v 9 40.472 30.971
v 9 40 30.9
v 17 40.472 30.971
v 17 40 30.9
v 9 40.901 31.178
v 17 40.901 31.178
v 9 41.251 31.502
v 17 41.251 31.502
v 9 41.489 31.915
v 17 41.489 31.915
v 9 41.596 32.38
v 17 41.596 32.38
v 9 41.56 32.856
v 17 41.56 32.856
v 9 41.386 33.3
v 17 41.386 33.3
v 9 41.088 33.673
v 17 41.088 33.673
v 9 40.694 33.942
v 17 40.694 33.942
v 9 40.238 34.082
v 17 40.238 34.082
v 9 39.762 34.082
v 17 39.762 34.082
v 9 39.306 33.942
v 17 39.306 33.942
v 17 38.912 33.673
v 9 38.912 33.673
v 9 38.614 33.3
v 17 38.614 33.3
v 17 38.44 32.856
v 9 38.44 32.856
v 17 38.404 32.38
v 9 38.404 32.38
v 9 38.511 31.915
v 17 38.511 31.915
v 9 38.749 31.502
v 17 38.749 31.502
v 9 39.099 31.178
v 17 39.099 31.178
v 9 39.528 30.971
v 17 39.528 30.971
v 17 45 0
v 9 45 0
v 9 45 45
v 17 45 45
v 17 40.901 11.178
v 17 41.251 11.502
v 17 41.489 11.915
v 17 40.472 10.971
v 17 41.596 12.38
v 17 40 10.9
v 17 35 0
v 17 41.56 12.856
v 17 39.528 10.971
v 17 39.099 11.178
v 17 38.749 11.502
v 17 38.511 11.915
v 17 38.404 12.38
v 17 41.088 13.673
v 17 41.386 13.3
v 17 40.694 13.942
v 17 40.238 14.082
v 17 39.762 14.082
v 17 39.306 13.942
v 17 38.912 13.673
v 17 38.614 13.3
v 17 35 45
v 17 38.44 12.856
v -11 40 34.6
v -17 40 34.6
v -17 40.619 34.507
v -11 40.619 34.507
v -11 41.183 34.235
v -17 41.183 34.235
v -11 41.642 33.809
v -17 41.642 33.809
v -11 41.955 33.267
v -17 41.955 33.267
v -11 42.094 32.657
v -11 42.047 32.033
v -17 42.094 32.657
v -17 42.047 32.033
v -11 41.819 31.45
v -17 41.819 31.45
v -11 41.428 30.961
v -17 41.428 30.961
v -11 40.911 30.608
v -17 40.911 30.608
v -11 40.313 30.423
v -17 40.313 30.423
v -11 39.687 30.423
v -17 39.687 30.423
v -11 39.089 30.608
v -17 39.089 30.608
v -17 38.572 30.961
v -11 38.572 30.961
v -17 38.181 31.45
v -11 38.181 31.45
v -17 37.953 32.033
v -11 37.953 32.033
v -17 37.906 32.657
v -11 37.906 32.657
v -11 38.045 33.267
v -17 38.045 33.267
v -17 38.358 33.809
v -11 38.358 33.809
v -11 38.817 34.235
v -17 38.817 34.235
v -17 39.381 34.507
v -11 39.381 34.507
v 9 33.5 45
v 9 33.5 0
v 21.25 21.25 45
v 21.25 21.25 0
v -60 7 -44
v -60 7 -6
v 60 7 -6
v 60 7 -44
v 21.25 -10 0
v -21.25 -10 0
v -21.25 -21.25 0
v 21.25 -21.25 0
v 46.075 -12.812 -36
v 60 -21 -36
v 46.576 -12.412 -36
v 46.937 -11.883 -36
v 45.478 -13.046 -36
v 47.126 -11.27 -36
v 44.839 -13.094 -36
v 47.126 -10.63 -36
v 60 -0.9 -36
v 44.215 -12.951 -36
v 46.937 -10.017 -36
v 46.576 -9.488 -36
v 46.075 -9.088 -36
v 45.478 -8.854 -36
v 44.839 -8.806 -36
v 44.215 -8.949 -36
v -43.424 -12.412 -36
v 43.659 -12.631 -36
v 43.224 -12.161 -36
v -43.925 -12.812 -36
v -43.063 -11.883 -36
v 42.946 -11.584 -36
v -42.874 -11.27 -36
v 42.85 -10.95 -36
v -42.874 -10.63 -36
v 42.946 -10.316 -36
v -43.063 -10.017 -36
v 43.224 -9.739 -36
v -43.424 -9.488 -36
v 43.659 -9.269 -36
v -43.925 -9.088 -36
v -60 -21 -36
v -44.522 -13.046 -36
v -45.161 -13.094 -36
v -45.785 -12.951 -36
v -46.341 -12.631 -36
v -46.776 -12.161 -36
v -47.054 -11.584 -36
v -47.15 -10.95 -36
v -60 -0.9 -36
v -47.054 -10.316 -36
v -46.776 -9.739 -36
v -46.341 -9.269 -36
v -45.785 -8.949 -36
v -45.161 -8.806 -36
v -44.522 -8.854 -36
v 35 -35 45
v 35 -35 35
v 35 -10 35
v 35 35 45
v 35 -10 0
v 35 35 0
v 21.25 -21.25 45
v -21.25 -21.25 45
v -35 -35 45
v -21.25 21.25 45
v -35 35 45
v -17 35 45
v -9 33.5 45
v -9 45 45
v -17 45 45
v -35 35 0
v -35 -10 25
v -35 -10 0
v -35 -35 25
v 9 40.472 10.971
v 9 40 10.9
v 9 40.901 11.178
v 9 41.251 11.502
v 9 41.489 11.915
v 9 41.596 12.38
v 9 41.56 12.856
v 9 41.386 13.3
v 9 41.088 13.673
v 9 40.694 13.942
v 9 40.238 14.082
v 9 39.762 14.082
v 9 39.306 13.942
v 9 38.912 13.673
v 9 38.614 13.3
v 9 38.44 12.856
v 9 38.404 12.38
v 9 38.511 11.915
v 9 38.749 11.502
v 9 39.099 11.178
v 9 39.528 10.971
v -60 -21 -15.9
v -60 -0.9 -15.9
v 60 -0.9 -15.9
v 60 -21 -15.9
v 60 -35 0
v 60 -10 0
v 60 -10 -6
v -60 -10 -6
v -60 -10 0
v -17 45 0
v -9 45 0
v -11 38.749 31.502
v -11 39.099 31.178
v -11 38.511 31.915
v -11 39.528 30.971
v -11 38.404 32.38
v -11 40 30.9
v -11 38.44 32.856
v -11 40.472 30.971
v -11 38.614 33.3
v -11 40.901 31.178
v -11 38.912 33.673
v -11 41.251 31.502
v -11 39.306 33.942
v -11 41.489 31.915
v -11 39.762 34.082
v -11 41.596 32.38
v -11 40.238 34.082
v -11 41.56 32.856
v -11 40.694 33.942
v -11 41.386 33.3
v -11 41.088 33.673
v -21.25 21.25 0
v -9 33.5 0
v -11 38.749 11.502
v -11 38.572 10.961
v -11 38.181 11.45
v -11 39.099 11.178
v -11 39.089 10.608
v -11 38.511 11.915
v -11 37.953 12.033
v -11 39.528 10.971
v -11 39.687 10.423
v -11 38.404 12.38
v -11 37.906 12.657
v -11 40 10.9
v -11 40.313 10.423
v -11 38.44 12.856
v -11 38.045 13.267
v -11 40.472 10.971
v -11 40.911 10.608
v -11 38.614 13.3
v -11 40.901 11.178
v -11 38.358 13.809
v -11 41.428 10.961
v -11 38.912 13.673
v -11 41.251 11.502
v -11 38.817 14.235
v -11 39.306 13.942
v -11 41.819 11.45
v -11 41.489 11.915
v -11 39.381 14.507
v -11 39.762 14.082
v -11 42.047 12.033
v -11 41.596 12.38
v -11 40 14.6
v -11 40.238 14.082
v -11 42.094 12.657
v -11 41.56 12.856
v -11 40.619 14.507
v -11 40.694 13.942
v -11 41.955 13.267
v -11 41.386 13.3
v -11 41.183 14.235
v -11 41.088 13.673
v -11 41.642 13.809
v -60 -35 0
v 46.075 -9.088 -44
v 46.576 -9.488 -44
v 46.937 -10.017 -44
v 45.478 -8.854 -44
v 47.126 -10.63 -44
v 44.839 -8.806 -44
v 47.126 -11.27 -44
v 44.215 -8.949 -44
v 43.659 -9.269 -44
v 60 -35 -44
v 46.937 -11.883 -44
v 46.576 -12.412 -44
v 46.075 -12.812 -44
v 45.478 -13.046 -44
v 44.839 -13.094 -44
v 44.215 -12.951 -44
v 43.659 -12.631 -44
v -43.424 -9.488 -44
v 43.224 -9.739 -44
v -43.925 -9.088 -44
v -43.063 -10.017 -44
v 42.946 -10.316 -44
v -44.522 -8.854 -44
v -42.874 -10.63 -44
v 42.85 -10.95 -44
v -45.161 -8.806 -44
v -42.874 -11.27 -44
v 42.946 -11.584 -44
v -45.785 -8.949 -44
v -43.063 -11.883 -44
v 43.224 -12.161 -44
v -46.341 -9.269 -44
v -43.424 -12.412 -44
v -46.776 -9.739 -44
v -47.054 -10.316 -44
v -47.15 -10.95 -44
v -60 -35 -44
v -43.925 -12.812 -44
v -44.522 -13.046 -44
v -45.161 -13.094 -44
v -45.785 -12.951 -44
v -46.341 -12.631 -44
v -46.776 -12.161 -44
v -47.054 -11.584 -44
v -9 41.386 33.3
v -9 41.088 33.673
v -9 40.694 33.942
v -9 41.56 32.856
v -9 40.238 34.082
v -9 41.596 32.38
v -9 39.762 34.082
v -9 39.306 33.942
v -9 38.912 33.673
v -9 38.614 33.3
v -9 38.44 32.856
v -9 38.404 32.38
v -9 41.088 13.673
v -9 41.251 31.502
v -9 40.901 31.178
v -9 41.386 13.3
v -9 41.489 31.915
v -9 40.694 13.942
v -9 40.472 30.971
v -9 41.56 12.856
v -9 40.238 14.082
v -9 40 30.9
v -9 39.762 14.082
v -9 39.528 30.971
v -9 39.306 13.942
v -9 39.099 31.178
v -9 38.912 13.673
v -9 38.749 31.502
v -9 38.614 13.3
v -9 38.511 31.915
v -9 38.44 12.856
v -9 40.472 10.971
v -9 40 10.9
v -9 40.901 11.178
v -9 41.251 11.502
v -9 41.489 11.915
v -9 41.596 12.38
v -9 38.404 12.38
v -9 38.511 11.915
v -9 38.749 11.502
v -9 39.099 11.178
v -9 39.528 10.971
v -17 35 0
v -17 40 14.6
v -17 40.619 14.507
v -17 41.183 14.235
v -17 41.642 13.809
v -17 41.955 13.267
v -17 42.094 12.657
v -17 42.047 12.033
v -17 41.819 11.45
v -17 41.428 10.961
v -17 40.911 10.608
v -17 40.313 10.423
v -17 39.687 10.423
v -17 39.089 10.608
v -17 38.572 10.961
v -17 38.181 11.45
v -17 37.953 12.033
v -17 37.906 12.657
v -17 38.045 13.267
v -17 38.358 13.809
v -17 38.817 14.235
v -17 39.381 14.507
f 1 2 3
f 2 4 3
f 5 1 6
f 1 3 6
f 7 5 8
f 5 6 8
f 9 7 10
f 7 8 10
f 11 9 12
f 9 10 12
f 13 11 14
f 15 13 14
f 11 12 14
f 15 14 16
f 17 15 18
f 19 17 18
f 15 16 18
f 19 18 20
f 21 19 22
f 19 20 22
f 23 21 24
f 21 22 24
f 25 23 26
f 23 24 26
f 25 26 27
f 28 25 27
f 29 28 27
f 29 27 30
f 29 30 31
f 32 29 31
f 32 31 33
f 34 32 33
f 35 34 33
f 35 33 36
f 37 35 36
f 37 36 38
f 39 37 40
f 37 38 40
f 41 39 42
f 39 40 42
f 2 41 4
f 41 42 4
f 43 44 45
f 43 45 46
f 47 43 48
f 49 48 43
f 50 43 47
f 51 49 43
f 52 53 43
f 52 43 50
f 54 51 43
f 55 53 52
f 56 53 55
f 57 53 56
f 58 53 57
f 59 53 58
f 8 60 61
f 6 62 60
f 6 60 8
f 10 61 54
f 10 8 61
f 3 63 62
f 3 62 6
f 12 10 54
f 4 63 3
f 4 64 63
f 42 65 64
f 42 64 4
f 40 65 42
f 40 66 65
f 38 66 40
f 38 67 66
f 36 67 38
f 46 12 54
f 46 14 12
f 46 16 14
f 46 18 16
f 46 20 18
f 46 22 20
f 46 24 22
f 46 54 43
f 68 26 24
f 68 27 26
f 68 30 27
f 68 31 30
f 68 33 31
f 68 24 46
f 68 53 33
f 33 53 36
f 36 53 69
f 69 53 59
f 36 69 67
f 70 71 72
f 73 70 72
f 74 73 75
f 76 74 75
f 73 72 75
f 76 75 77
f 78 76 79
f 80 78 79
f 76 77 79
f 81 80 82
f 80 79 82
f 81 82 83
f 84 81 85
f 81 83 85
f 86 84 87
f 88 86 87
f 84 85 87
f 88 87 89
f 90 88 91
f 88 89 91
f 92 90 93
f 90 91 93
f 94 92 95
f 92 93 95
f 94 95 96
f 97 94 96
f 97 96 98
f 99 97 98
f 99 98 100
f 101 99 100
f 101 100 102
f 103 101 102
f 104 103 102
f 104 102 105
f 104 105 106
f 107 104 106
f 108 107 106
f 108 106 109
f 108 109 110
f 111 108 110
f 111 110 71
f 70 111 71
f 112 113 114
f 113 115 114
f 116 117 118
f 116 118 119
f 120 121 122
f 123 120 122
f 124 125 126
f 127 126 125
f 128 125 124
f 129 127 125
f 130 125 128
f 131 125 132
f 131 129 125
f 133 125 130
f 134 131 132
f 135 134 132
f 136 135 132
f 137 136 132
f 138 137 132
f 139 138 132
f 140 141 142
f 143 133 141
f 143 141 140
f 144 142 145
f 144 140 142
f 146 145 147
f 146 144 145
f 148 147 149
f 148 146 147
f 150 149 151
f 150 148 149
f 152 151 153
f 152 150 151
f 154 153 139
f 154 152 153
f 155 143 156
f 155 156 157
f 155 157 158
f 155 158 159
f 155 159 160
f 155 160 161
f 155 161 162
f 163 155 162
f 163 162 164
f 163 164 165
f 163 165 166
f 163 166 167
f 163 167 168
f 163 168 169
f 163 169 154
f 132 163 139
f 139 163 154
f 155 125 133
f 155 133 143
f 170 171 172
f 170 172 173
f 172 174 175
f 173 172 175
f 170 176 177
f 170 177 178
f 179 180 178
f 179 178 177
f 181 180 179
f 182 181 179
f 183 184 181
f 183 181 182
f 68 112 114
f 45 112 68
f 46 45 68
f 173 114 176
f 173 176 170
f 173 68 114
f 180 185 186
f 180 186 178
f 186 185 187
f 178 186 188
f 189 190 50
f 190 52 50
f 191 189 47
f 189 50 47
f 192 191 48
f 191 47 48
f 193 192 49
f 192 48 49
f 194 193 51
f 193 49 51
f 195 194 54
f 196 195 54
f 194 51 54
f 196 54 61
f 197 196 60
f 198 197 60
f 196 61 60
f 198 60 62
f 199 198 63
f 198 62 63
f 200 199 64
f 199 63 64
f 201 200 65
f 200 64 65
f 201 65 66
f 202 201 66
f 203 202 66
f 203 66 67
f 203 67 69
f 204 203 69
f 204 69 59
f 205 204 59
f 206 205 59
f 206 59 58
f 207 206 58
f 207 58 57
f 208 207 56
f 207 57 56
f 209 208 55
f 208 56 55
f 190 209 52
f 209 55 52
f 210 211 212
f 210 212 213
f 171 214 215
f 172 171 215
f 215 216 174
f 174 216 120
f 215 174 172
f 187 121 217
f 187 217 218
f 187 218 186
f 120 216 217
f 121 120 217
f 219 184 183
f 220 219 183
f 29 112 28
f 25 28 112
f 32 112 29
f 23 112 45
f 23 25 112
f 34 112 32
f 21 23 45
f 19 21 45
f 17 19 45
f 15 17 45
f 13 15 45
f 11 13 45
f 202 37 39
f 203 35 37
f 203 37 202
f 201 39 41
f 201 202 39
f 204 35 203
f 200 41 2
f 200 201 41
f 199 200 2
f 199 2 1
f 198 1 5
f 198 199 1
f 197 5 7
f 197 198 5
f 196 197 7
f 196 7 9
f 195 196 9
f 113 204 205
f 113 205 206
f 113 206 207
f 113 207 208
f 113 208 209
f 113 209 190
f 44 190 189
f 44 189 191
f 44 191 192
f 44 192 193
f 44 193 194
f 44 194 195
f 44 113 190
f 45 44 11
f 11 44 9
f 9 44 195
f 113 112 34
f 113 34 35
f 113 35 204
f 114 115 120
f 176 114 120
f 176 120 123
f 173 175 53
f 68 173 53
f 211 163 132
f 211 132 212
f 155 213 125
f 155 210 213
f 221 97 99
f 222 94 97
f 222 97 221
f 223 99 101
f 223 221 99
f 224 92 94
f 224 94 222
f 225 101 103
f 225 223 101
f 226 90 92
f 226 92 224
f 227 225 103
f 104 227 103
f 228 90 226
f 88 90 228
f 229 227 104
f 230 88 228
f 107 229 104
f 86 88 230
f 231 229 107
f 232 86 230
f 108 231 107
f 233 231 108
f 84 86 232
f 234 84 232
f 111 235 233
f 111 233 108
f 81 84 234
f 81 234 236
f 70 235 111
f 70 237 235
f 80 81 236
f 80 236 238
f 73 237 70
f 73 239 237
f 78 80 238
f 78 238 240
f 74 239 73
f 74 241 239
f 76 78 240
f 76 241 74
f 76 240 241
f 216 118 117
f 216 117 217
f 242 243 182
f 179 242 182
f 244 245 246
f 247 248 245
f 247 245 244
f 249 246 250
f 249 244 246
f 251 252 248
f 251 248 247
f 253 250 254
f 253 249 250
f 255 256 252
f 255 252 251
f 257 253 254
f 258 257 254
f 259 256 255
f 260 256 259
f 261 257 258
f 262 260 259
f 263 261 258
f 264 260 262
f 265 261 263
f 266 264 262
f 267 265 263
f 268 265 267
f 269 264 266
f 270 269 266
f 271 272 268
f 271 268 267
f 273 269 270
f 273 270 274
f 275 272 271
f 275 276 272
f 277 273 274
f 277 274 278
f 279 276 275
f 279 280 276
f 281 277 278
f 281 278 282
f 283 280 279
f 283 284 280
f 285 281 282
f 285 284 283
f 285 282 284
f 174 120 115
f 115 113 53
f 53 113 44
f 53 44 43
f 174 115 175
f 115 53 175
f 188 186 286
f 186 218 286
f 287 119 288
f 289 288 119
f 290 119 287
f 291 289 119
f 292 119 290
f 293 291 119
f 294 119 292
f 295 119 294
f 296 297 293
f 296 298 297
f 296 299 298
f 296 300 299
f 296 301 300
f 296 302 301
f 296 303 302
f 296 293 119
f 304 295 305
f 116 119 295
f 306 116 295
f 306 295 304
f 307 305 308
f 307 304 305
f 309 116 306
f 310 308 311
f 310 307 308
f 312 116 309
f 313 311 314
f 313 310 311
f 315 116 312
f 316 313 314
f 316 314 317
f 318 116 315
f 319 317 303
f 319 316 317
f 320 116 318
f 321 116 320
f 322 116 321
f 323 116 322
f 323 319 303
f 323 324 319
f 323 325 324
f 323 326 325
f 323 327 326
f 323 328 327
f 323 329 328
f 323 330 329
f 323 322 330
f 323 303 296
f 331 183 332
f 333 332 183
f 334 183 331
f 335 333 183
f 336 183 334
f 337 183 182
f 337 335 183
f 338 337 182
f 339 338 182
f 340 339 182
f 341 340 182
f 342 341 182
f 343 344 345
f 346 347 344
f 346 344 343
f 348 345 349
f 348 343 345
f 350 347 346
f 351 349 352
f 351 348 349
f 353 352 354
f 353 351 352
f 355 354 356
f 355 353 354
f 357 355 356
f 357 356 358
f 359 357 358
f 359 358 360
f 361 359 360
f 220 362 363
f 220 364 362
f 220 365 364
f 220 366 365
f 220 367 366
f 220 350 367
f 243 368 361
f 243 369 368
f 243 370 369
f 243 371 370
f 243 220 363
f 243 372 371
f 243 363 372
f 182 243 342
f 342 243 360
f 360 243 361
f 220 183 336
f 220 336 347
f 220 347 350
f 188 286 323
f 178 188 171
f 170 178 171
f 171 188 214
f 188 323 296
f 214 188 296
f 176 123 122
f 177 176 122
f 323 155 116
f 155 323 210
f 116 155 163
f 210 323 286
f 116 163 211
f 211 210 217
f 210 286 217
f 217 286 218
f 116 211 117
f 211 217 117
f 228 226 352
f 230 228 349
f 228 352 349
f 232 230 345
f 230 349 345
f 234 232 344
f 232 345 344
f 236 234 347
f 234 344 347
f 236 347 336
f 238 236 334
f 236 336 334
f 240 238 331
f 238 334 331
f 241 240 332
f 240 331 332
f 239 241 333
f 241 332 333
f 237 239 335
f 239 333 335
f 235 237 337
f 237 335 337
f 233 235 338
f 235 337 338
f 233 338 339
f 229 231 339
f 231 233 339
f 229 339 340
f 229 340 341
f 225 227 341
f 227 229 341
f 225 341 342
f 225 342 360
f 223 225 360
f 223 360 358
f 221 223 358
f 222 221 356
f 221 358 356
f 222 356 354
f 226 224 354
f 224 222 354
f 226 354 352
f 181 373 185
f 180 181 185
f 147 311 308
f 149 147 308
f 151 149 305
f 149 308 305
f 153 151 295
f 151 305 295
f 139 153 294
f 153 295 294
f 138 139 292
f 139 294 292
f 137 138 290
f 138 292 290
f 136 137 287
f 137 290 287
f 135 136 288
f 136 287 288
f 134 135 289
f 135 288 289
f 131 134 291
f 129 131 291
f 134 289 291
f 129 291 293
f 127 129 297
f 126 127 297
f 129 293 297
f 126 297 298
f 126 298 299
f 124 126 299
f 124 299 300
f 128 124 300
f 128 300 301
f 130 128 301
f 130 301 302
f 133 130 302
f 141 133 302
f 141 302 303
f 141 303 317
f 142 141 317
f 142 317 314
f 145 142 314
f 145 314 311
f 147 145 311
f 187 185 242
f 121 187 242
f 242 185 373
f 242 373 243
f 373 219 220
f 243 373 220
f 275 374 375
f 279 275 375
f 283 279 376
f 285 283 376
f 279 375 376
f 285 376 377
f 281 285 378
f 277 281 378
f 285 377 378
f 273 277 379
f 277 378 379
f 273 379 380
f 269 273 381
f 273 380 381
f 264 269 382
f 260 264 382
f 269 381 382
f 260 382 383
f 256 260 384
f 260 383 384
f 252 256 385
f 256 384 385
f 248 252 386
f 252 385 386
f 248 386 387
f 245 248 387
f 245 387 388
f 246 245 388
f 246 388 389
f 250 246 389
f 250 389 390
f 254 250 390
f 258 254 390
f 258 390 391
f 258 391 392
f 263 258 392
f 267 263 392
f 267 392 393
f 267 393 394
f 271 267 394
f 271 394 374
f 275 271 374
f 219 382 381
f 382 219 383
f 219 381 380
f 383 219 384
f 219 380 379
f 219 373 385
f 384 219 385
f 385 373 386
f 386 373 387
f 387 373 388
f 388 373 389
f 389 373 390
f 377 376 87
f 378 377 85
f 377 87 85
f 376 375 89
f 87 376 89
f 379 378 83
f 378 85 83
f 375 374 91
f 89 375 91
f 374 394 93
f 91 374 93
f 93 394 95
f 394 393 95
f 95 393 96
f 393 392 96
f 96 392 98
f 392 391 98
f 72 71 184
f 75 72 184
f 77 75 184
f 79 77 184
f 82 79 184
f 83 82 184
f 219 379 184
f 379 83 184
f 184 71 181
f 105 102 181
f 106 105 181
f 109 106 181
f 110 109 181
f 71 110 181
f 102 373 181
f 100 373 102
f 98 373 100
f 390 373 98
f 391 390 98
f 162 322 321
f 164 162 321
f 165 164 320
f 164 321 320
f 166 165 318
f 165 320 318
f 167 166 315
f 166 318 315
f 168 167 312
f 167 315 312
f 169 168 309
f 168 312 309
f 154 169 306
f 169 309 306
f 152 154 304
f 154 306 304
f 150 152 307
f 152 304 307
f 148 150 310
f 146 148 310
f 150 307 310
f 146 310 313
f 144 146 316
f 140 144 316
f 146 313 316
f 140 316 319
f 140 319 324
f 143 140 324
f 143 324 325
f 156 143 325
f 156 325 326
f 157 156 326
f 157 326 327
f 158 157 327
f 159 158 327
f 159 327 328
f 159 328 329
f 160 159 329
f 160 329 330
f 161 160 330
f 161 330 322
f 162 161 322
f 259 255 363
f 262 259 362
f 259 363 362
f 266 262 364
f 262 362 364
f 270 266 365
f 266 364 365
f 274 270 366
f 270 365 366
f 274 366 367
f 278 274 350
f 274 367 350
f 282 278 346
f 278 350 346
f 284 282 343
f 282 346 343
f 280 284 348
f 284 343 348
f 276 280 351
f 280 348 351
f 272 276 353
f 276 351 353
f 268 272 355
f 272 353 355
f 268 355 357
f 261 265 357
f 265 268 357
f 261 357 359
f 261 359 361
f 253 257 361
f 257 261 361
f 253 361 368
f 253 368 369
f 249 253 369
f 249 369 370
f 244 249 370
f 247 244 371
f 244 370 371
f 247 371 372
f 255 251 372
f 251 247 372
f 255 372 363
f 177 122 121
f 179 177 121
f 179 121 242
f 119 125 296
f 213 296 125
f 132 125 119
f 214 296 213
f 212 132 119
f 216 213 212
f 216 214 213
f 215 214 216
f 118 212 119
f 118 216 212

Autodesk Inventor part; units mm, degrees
ref_plane "YZ Plane" through (0, 0, 0) normal (1, 0, 0) x (0, 1, 0)
ref_plane "XZ Plane" through (0, 0, 0) normal (0, 1, 0) x (-1, 0, 0)
ref_plane "XY Plane" through (0, 0, 0) normal (0, 0, 1) x (1, 0, 0)
sketch "Sketch1" plane through (0, 0, 0) normal (0, 0, 1) x (1, 0, 0)
  line L0 (-21.25, 21.25) -> (21.25, 21.25)
  line L1 (21.25, 21.25) -> (21.25, -21.25)
  line L2 (21.25, -21.25) -> (-21.25, -21.25)
  line L3 (-21.25, -21.25) -> (-21.25, 21.25)
  line L4 (-35, -35) -> (35, -35)
  line L5 (35, -35) -> (35, 35)
  line L6 (35, 35) -> (-35, 35)
  line L7 (-35, 35) -> (-35, -35)
  line L8 (-9, 35) -> (-9, 21.25)
  line L9 (9, 21.25) -> (9, 35)
  point P0 (0, 0)
  point P1 (-21.25, 0)
  point P2 (0, 21.25)
  point P3 (-35, 0)
  point P4 (0, 35)
  dimension "d0" = 42.5
  dimension "d1" = 9
  dimension "d3" = 70
  dimension "d17" = 18
extrude "Extrusion1" add sketch "Sketch1" along normal blind 45 contours L3 L2 L1 L0 L9 L6 L5 L4 L7 L8
sketch "Sketch4" plane through (0, 0, 0) normal (1, 0, 0) x (0, 1, 0)
  line L0 (-0.9, -15.9) -> (-21, -15.9)
  line L1 (-21, -15.9) -> (-21, -36)
  line L2 (-21, -36) -> (-0.9, -36)
  line L3 (-0.9, -36) -> (-0.9, -15.9)
  line L4 (-35, 0) -> (-35, 45) projected
  line L5 (7, -6) -> (7, -44)
  line L6 (7, -44) -> (-35, -44)
  line L7 (-35, -44) -> (-35, 0)
  line L8 (7, -6) -> (-10, -6)
  line L9 (-10, -6) -> (-10, 0)
  line L10 (-10, 0) -> (-35, 0)
  point P0 (0, 0)
  dimension "d18" = 20.1
  dimension "d20" = 14
  dimension "d21" = 42
  dimension "d22" = 38
  dimension "d30" = 8
  dimension "d31" = 6
  dimension "d32" = 25
extrude "Extrusion5" add sketch "Sketch4" along normal mid plane 120
sketch "Sketch5" plane through (60, 7, -44) normal (0, 0, -1) x (-1, 0, 0)
  circle A0 centre (15, -17.95) radius 2.15
  circle A1 centre (105, -17.95) radius 2.15
  line L0 (120, -7.9) -> (120, -7.9) projected
  line L1 (120, 0) -> (120, -42) projected
  line L2 (0, -42) -> (0, 0) projected
  line L3 (120, -28) -> (120, -7.9) projected
  point P0 (60, -7)
  point P1 (120, -21)
  point P2 (120, -17.95)
  dimension "d27" = 4.3
  dimension "d58" = 15
  dimension "d59" = 15
extrude "Extrusion6" cut sketch "Sketch5" against normal blind 18
sketch "Sketch6" plane through (9, 35, 0) normal (0, 1, 0) x (1, 0, 0)
  line L0 (26, 0) -> (0, 0) projected
  line L1 (0, 0) -> (8, 0)
  line L2 (8, 0) -> (8, -45)
  line L3 (8, -45) -> (0, -45)
  line L4 (0, -45) -> (0, 0)
  line L5 (-18, 0) -> (-18, -45) projected
  line L6 (-18, 0) -> (-26, 0)
  line L7 (-26, 0) -> (-26, -45)
  line L8 (-26, -45) -> (-18, -45)
  line L9 (-18, -45) -> (-18, 0)
  line L10 (26, -45) -> (0, -45) projected
  point P0 (-9, 0)
  dimension "d39" = 8
extrude "Extrusion7" add sketch "Sketch6" along normal blind 10
sketch "Sketch7" plane through (17, 35, 45) normal (1, 0, 0) x (0, 0, -1)
  circle A0 centre (12.5, 5) radius 1.6
  circle A1 centre (32.5, 5) radius 1.6
  line L0 (45, 10) -> (0, 10) projected
  point P0 (45, -35)
  point P1 (22.5, 10)
  dimension "d42" = 20
  dimension "d43" = 10
  dimension "d44" = 5
  dimension "d45" = 3.2
extrude "Extrusion8" cut sketch "Sketch7" against normal through all
sketch "Sketch8" plane through (-17, 35, 0) normal (-1, 0, 0) x (0, 0, 1)
  circle A0 centre (12.5, 5) radius 1.6 projected
  circle A1 centre (32.5, 5) radius 1.6 projected
  circle A2 centre (12.5, 5) radius 2.1
  circle A3 centre (32.5, 5) radius 2.1
  point P0 (0, -35)
  dimension "d48" = 4.2
extrude "Extrusion9" cut sketch "Sketch8" against normal blind 6
chamfer "Chamfer1" distance 25 angle 45 1 edges at (-35, -22.5, 0)
chamfer "Chamfer2" distance 35 distance2 25 1 edges at (35, -22.5, 0) measured on face at (35, -3.3333, 30)
chamfer "Chamfer3" distance 12.25 angle 45 2 edges at (-9, 21.25, 22.5) (9, 21.25, 22.5)
equation "\"d1\" = 0.5 * d17"
equation "\"d59\" = d58"
equation "\"d43\" = 0.5 * d42"
properties part number "Motorhalterig"
